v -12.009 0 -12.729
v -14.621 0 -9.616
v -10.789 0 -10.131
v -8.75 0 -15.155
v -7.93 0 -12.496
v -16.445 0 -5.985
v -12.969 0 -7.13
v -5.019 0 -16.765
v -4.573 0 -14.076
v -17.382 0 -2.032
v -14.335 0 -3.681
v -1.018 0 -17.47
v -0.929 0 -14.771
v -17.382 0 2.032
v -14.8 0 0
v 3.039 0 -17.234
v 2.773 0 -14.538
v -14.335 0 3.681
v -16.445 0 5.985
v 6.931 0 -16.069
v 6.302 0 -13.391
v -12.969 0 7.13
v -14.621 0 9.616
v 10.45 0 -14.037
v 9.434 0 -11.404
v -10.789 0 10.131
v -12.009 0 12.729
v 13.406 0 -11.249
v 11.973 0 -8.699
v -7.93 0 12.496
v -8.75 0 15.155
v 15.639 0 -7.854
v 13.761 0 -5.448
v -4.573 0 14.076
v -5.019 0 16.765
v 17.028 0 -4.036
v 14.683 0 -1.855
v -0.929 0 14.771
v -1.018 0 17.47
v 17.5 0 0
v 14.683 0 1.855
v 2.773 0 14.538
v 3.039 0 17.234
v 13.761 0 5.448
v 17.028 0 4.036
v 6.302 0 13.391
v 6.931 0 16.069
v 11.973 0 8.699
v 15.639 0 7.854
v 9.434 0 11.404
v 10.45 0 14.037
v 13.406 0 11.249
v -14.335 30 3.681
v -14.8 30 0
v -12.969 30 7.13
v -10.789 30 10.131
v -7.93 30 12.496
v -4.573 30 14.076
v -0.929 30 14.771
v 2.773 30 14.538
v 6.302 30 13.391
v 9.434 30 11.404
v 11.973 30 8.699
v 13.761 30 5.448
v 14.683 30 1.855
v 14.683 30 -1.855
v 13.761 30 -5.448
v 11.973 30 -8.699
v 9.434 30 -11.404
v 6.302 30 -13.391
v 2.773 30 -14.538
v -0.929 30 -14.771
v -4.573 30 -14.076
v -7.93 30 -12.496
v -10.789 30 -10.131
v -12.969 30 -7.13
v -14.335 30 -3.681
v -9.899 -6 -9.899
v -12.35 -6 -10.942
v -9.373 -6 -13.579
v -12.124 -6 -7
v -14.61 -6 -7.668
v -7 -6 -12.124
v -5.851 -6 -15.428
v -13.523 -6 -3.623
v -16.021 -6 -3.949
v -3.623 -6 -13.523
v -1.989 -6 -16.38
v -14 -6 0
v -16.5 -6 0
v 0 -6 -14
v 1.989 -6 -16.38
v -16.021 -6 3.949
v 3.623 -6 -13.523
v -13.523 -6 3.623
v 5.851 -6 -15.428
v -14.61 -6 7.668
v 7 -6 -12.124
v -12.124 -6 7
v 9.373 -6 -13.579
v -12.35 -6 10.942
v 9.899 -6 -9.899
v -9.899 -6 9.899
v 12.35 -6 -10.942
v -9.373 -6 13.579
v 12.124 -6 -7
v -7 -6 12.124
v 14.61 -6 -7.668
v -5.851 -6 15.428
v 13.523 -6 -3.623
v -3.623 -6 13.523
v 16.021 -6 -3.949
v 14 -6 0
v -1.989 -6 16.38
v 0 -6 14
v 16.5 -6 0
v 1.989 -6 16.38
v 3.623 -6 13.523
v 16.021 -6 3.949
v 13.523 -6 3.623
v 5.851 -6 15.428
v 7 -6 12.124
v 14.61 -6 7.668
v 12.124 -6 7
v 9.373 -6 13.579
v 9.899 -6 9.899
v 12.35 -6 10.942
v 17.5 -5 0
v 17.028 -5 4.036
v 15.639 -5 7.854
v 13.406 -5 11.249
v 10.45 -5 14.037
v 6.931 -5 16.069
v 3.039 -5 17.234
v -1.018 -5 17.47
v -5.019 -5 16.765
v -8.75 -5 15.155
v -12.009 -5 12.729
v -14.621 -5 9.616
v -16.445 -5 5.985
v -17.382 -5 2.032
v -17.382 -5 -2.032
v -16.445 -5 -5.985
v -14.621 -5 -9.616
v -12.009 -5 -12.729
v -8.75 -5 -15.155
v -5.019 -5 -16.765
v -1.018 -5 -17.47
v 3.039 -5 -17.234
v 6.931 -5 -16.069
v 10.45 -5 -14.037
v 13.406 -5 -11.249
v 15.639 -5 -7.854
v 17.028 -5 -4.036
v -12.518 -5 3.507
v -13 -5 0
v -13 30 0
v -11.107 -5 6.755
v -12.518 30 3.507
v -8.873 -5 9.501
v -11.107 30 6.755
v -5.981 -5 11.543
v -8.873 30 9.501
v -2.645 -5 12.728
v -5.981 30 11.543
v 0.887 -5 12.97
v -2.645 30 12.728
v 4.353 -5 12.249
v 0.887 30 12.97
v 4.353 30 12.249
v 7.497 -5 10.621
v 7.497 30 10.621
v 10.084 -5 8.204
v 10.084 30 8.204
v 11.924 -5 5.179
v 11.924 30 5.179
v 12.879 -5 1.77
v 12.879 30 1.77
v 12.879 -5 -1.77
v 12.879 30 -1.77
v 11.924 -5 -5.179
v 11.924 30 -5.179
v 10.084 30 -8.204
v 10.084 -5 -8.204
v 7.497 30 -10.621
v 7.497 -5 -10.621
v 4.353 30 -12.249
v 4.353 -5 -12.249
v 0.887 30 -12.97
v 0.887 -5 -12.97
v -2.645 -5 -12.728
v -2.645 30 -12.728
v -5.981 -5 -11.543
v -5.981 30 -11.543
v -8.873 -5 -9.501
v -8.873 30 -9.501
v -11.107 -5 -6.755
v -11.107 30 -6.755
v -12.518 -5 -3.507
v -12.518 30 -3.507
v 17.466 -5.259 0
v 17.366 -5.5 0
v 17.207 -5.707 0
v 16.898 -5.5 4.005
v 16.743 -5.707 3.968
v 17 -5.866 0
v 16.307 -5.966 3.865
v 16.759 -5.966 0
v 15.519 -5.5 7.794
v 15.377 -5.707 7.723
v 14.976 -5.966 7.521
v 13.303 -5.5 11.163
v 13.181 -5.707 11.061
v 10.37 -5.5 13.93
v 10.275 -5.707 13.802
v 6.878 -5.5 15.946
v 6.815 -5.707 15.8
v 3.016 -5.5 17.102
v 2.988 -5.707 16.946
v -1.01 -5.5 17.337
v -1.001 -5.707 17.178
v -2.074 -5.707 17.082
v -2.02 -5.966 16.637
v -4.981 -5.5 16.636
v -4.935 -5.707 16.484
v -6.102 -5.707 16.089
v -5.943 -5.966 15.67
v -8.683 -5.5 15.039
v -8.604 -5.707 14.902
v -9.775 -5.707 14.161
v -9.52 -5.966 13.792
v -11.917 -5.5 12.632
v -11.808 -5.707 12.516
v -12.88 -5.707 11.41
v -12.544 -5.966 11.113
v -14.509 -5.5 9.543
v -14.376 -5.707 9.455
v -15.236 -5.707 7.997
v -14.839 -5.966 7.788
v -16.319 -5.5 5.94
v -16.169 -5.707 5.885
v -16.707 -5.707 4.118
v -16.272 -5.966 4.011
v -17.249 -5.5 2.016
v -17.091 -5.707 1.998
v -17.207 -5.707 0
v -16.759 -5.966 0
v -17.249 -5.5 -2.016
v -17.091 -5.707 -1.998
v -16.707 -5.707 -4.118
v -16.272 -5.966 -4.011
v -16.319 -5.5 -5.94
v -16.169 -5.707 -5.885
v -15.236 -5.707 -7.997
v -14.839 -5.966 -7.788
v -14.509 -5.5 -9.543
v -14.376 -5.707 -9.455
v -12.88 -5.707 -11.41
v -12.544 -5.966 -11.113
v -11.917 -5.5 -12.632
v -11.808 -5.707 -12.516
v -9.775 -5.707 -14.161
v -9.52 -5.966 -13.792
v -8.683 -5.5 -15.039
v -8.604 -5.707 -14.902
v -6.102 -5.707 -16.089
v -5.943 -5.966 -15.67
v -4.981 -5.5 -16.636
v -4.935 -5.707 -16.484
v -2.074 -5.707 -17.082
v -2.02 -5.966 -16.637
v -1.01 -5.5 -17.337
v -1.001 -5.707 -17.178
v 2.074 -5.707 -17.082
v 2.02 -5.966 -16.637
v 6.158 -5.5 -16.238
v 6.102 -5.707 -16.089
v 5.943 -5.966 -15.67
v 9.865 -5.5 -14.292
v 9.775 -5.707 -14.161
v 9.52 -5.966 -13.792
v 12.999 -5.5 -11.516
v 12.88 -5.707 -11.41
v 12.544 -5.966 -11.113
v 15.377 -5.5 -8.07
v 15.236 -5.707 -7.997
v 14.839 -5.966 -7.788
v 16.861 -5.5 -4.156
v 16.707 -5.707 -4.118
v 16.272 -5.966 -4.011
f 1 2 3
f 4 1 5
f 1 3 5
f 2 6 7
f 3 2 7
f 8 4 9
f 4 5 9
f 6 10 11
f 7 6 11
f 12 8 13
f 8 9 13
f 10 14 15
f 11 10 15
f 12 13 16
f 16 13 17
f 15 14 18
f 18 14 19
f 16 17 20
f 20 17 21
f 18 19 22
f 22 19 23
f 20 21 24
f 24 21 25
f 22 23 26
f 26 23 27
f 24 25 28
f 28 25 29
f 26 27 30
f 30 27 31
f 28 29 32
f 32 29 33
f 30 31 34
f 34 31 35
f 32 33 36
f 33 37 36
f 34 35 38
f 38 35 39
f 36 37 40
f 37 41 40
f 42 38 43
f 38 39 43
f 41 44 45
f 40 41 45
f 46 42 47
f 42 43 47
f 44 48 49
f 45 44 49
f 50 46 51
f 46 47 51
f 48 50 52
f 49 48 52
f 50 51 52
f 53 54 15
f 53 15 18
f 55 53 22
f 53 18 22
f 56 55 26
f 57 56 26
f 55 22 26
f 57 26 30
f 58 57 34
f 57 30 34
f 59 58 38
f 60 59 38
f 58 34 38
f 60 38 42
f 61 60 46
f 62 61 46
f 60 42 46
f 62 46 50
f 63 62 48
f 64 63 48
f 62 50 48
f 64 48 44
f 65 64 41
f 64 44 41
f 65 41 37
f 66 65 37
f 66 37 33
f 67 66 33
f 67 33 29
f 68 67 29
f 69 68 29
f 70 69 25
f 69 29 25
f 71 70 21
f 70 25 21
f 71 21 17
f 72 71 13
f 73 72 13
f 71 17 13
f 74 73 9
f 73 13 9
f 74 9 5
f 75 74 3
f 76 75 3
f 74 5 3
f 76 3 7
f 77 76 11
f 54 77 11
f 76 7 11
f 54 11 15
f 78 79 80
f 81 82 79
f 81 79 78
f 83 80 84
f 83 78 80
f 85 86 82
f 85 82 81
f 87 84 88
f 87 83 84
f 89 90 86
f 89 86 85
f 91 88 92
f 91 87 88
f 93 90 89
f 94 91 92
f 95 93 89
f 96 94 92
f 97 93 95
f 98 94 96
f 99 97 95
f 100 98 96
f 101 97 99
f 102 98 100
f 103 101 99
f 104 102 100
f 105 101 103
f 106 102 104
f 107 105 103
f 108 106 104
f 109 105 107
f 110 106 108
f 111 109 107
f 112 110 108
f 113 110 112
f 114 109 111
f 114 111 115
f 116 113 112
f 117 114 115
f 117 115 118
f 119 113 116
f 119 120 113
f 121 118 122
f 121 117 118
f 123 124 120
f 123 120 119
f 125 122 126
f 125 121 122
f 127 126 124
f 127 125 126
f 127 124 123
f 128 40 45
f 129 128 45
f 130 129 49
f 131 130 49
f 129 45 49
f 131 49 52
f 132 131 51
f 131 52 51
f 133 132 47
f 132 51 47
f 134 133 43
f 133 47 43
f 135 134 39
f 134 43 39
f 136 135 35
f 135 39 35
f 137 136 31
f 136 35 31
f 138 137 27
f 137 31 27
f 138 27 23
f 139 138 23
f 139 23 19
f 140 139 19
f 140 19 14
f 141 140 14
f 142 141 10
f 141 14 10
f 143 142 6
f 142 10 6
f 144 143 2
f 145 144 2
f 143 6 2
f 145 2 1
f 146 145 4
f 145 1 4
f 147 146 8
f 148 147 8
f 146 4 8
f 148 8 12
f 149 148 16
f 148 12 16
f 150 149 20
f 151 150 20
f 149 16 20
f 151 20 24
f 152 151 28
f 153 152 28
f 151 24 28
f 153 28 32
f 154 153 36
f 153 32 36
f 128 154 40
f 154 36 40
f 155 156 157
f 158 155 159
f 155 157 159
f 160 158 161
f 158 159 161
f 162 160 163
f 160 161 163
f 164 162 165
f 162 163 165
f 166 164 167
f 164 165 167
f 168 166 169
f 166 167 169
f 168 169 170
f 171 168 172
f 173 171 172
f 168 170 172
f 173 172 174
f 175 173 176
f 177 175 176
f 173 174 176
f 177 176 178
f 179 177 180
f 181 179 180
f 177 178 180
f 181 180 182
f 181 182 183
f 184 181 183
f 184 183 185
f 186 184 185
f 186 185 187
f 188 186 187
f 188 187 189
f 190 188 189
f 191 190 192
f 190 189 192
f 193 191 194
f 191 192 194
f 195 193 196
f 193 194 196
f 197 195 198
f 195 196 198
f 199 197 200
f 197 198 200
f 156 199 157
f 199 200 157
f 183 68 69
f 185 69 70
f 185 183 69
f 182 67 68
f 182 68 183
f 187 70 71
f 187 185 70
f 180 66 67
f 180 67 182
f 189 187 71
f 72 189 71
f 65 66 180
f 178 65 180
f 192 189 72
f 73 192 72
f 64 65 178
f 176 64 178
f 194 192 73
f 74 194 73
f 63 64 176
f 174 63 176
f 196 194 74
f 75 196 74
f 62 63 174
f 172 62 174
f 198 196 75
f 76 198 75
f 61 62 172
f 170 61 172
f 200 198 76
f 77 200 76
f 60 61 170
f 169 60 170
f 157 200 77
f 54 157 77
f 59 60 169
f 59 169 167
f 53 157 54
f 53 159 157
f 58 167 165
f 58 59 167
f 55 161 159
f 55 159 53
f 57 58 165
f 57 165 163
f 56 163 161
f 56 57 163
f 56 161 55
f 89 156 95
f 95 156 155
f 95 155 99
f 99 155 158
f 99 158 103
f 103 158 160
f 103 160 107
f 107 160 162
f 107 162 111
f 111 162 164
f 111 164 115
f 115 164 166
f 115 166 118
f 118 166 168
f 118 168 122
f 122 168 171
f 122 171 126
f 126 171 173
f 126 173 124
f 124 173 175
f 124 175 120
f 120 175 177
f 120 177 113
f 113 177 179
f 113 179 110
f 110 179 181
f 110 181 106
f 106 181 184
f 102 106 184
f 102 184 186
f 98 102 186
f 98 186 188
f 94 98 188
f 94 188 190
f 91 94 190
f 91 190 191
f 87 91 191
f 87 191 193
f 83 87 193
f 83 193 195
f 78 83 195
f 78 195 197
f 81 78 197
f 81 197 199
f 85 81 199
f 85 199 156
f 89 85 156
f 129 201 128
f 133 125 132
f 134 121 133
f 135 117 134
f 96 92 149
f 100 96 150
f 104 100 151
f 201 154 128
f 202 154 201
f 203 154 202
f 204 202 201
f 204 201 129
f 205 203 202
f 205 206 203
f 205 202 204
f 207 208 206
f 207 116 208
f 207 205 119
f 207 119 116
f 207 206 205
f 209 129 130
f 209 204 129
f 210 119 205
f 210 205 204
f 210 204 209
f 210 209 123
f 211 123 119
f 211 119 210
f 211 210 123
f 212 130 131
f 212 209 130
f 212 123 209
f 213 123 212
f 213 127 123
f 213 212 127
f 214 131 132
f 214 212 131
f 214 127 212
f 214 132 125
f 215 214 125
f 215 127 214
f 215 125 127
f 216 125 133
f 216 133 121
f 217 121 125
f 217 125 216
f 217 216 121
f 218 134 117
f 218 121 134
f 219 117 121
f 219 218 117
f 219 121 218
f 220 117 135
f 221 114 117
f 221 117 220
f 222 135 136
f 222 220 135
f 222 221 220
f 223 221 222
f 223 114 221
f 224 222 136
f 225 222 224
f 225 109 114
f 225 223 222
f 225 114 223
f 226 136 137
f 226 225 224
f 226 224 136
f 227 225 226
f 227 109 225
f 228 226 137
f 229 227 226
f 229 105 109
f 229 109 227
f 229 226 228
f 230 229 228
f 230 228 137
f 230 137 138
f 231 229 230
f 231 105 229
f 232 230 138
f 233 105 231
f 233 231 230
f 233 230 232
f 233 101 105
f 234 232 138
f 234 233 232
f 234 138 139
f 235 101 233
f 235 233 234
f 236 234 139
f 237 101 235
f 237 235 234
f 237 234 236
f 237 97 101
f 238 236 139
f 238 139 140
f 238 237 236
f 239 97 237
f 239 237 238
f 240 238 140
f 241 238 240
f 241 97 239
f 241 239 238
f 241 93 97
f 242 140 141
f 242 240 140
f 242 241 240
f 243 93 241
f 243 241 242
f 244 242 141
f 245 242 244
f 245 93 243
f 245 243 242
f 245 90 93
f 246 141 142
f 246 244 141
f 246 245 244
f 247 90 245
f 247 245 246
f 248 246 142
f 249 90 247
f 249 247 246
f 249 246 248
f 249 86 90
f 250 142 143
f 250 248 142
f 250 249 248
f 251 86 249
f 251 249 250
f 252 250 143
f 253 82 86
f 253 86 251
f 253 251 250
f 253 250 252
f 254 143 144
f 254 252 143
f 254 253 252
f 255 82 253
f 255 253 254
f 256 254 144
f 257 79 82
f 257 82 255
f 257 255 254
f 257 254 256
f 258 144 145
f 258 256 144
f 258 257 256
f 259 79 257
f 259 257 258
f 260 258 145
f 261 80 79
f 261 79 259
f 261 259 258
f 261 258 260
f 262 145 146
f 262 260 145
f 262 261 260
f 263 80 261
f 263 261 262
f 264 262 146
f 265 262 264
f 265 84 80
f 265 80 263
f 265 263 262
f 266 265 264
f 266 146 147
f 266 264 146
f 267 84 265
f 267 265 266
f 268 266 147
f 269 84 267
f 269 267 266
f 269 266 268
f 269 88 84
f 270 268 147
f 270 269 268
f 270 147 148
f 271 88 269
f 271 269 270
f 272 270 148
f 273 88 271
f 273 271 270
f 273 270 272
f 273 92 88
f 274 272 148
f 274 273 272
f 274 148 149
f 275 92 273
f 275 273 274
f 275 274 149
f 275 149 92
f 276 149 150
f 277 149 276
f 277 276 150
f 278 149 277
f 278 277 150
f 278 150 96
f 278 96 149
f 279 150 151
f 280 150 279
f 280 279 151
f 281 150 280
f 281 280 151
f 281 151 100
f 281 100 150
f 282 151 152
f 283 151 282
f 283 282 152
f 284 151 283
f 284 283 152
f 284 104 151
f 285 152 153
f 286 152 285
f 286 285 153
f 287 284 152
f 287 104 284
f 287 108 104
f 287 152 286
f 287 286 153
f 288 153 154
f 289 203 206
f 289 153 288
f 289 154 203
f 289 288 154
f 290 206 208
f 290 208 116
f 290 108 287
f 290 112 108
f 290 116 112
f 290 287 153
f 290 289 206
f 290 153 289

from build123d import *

# Parameters (mm, degrees)
F0_R           = 17.5
F1_DEPTH       = 6
F2_R           = 1
F3_R           = 14.8
F4_DEPTH       = 30
F6_D           = 26
F6_DEPTH       = 60
F6_CSINK_D     = 28
F6_CSINK_ANGLE = 90


with BuildPart() as f1:
    # F0 (on Front) → F1 (new body)
    with BuildSketch(Plane.XZ):
        Circle(F0_R)
    extrude(amount=F1_DEPTH)

    # F2
    f2_edges = [f1.edges().sort_by_distance(p)[0] for p in [
        (-17.5, -6, 0),
    ]]
    fillet(f2_edges, radius=F2_R)

    # F3 (on face) → F4 (join)
    with BuildSketch(Plane(origin=(0, 0, 0), x_dir=(-1, 0, 0), z_dir=(0, 1, 0))):
        Circle(F3_R)
    extrude(amount=F4_DEPTH)

    # F6
    with Locations(Plane.XZ.offset(6)):
        with Locations((0, 0)):
            CounterSinkHole(F6_D / 2, F6_CSINK_D / 2, depth=F6_DEPTH, counter_sink_angle=F6_CSINK_ANGLE)


solid = f1.part
